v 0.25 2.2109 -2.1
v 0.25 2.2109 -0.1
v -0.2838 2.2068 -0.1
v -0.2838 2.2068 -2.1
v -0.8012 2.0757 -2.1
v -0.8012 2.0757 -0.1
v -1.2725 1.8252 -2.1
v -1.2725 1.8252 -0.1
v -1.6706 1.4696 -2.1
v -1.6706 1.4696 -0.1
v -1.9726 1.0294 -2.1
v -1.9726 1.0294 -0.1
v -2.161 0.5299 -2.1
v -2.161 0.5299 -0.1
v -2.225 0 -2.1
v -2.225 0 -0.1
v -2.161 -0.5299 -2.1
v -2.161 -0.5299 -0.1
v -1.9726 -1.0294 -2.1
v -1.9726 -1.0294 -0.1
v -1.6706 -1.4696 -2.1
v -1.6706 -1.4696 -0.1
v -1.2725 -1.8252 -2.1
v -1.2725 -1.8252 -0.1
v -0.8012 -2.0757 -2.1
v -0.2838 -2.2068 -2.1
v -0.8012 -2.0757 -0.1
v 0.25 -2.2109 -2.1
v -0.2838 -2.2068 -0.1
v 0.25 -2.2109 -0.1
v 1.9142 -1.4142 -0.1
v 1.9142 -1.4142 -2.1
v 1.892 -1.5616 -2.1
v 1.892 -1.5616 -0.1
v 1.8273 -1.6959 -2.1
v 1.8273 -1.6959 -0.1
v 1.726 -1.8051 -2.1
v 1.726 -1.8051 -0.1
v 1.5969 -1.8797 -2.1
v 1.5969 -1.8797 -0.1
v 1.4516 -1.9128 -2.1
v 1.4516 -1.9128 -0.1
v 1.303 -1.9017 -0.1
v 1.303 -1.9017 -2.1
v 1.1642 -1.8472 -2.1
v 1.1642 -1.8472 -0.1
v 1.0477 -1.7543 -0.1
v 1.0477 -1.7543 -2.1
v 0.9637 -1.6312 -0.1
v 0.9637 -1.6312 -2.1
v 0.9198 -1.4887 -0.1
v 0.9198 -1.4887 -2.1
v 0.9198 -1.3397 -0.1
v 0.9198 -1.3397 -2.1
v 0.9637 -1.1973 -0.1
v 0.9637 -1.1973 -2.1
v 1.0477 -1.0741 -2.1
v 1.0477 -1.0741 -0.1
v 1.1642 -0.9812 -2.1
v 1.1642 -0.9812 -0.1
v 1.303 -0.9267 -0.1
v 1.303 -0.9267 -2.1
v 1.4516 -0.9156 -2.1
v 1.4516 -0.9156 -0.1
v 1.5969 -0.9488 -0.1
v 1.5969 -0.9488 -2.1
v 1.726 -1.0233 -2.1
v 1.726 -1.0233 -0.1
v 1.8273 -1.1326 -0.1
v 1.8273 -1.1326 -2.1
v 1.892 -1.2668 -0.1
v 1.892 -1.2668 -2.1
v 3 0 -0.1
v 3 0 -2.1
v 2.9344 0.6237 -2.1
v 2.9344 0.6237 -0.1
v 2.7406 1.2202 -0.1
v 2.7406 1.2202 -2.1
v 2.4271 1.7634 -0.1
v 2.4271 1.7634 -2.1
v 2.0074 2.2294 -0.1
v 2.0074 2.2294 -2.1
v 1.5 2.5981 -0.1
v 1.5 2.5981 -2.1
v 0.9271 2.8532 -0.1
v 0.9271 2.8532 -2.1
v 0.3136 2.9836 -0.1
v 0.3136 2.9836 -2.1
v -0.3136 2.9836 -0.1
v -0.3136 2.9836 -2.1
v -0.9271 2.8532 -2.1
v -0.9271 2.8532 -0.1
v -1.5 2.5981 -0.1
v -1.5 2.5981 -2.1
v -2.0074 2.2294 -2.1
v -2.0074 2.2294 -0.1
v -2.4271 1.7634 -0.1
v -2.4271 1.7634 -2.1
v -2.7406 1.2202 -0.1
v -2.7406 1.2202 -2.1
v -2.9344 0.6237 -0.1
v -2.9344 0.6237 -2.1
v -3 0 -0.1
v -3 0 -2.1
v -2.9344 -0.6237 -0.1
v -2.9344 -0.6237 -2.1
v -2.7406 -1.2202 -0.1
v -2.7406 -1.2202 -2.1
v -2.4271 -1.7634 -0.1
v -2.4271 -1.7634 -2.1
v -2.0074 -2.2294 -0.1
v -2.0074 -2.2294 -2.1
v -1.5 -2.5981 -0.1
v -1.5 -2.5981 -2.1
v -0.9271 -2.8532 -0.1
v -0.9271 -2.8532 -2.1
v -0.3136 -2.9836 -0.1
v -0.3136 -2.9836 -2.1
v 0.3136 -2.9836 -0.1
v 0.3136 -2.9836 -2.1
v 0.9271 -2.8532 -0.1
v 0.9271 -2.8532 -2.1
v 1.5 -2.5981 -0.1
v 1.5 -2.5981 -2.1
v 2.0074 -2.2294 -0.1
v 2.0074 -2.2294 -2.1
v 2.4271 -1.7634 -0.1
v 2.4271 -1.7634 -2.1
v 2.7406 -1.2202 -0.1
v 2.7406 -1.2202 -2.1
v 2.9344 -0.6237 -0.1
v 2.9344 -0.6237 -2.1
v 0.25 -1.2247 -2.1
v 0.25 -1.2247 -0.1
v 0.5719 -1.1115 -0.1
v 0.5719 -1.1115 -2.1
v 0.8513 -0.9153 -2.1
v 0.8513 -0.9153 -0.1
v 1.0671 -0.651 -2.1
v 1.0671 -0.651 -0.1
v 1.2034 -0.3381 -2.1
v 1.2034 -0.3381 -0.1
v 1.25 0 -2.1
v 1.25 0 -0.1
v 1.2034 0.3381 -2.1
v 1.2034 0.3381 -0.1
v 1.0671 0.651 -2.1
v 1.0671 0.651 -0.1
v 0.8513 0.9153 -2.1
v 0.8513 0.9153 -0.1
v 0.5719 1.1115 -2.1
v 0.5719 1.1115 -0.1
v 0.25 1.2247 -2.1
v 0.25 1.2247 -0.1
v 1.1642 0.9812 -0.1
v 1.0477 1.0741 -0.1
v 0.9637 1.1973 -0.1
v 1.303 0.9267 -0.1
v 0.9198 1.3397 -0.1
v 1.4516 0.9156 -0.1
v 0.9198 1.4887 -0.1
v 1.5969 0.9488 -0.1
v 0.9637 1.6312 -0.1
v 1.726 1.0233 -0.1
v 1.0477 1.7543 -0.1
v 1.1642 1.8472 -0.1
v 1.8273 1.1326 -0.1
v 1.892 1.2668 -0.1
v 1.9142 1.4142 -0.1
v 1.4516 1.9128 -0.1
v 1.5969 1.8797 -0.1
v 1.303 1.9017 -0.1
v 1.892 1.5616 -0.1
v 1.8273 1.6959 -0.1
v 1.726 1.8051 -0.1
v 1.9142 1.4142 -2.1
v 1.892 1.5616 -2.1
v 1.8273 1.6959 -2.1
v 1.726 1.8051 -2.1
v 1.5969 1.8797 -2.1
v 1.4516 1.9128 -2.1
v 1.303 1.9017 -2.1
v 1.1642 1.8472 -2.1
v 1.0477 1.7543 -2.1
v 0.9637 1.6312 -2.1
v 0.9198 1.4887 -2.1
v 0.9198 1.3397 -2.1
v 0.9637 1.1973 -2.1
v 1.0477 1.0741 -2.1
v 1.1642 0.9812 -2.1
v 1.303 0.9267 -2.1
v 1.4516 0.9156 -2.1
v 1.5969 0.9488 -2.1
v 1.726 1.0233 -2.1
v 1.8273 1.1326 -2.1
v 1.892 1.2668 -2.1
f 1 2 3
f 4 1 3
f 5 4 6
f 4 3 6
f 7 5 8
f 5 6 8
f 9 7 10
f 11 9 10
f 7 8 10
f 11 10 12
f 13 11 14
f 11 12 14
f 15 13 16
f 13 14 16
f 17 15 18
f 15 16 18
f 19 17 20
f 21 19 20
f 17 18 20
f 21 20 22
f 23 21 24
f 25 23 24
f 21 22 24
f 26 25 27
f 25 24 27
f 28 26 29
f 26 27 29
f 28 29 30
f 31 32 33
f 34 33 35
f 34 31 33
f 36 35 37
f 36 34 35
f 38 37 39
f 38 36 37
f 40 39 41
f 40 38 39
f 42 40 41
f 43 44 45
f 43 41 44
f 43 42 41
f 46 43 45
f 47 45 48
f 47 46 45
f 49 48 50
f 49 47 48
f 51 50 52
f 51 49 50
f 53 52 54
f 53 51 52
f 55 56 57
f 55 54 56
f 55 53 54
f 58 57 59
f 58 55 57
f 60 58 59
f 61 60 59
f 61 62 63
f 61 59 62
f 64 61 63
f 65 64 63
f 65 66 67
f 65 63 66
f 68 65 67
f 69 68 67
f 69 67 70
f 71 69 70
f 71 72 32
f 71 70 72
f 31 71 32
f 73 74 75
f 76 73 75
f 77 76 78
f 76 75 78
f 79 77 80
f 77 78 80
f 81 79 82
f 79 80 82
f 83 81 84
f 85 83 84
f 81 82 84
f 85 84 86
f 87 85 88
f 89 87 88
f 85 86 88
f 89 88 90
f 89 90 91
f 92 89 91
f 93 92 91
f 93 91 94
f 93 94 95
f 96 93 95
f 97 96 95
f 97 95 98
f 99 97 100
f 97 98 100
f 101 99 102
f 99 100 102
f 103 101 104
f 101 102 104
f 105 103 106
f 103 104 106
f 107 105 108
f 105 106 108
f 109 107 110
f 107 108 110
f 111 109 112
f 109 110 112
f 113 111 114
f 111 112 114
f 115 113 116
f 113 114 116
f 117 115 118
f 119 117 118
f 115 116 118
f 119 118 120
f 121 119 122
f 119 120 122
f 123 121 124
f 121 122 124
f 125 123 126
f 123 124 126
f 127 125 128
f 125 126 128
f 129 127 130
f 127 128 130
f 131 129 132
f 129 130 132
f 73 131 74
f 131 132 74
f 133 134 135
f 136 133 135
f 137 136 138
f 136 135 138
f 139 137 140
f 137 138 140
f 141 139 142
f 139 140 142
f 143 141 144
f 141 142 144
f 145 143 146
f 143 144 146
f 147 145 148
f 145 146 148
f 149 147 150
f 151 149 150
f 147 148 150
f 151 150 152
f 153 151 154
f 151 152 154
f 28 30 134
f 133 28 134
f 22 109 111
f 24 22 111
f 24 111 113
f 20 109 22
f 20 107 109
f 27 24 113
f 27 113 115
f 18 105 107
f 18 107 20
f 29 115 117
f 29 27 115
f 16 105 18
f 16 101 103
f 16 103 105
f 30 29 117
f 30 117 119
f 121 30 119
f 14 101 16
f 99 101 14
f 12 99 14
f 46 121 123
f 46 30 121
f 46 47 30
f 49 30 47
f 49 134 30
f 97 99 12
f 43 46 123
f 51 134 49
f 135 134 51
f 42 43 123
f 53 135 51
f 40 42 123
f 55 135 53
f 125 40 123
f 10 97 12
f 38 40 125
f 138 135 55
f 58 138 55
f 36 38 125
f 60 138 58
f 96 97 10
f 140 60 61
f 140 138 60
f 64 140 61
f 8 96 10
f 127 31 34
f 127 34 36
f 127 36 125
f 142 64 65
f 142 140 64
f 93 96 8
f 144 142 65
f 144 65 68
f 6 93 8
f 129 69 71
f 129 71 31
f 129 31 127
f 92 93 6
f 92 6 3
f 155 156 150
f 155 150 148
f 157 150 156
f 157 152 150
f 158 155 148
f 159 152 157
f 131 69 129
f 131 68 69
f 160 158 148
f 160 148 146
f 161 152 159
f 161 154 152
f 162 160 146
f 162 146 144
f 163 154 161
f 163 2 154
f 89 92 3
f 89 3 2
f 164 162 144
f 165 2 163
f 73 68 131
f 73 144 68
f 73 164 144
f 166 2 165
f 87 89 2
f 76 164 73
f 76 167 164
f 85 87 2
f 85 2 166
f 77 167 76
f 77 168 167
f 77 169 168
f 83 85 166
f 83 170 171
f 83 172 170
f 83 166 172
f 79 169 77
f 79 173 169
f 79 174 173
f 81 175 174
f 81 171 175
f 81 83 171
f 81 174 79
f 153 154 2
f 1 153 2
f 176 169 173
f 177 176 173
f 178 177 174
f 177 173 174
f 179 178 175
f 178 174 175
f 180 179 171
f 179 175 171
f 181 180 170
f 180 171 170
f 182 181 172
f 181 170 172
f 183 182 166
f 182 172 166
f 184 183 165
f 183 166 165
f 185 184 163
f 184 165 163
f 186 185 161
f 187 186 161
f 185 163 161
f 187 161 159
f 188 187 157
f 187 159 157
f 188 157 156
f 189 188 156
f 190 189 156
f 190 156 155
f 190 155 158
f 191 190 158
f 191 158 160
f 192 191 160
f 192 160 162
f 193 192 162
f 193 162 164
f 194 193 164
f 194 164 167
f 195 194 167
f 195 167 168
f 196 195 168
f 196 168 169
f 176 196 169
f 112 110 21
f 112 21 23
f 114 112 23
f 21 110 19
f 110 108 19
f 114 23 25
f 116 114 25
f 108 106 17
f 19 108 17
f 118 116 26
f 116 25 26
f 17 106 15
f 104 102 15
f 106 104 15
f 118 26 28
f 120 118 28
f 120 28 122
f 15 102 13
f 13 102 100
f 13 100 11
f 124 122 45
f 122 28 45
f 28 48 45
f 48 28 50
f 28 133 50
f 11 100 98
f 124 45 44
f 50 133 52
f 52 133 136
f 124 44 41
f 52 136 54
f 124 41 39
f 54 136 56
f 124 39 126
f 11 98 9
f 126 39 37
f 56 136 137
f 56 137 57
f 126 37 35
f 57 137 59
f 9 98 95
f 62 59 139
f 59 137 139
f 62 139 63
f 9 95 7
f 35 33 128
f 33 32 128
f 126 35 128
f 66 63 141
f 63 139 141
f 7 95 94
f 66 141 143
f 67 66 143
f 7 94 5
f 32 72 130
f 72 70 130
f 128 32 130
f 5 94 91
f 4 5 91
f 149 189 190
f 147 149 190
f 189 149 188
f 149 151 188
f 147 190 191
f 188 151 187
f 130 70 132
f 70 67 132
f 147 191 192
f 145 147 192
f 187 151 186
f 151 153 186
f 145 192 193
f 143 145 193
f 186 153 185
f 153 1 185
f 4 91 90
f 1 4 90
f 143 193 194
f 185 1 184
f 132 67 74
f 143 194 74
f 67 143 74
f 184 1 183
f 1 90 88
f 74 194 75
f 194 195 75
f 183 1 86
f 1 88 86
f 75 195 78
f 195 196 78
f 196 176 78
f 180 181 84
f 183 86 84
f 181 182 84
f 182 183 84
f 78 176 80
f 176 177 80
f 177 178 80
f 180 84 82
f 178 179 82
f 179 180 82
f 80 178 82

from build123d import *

# Parameters (mm, degrees)
BOSS_EXTRUDE1_START = -2.1
SKETCH1_R           = 3
BOSS_EXTRUDE1_DEPTH = 2
CUT_EXTRUDE1_DEPTH  = 3
SKETCH3_R           = 0.5
CUT_EXTRUDE2_DEPTH  = 3


with BuildPart() as part:
    # Sketch1 → Boss-Extrude1 (new body)
    with BuildSketch(Plane.XY.offset(BOSS_EXTRUDE1_START)):
        Circle(SKETCH1_R)
    extrude(amount=BOSS_EXTRUDE1_DEPTH)

    # Sketch2 → Cut-Extrude1 (cut, through all)
    with BuildSketch(Plane.XY.offset(-0.1)):
        with BuildLine():
            Line((0.25, 1.224744871), (0.25, 2.210910446))
            ThreePointArc((0.25, 2.210910446), (-2.225, 0), (0.25, -2.210910446))
            Line((0.25, -2.210910446), (0.25, -1.224744871))
            ThreePointArc((0.25, -1.224744871), (1.25, 0), (0.25, 1.224744871))
        make_face()
    extrude(amount=-CUT_EXTRUDE1_DEPTH, mode=Mode.SUBTRACT)

    # Sketch3 → Cut-Extrude2 (cut, through all)
    with BuildSketch(Plane.XY.offset(-0.1)):
        with Locations((1.414213562, 1.414213562)):
            Circle(SKETCH3_R)
    cut_extrude2 = extrude(amount=-CUT_EXTRUDE2_DEPTH, mode=Mode.SUBTRACT)

    # Mirror1: Cut-Extrude2 across plane
    add(cut_extrude2.mirror(Plane.ZX), mode=Mode.SUBTRACT)


solid = part.part
